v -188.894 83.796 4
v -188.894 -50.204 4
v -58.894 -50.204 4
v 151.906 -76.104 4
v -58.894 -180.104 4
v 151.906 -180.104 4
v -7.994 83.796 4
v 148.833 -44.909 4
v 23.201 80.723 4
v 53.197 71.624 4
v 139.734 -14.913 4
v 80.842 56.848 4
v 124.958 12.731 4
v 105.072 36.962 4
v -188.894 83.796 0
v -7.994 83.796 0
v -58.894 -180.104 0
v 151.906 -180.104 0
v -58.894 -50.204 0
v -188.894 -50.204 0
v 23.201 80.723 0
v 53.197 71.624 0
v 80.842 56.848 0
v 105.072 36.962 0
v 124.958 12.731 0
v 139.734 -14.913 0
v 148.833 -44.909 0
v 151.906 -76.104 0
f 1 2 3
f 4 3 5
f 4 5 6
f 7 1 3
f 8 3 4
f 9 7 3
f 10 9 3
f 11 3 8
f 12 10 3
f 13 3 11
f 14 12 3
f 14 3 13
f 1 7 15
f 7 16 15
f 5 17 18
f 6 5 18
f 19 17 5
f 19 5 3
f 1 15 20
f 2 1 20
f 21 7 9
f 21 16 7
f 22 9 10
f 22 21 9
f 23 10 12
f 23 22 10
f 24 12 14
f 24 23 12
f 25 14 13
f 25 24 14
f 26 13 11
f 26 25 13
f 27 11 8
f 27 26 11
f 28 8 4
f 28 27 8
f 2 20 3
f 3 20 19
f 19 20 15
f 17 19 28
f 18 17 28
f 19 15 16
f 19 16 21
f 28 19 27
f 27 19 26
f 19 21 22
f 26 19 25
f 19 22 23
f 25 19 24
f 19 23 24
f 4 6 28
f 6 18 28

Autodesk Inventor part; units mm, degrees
ref_plane "YZ Plane" through (0, 0, 0) normal (1, 0, 0) x (0, 1, 0)
ref_plane "XZ Plane" through (0, 0, 0) normal (0, 1, 0) x (-1, 0, 0)
ref_plane "XY Plane" through (0, 0, 0) normal (0, 0, 1) x (1, 0, 0)
sketch "Sketch1" plane through (0, 0, 0) normal (0, 0, 1) x (1, 0, 0)
  circle A0 centre (-7.9941, -76.1042) radius 50.9
  line L0 (42.9059, -433.1479) -> (-58.8941, -433.1479)
  arc A1 (-58.8941, -127.0042) -> (42.9059, -127.0042) centre (-7.9941, -76.1042) ccw
  line L1 (147.9059, -76.1042) -> (147.9059, -176.1042)
  line L2 (147.9059, -176.1042) -> (42.9059, -176.1042)
  line L3 (42.9059, -176.1042) -> (42.9059, -127.0042)
  line L4 (-58.8941, -176.1042) -> (-163.8941, -176.1042)
  line L5 (-163.8941, -176.1042) -> (-163.8941, -76.1042)
  line L6 (-163.8941, -76.1042) -> (-58.8941, -76.1042)
  line L7 (-58.8941, -76.1042) -> (-58.8941, -176.1042)
  line L8 (-58.8941, -176.1042) -> (42.9059, -176.1042)
  line L9 (-33.8941, -143.2668) -> (-33.8941, -176.1042)
  arc A2 (147.9059, -76.1042) -> (-163.8941, -76.1042) centre (-7.9941, -76.1042) ccw
  line L10 (-58.8941, -180.1042) -> (-167.8941, -180.1042)
  line L11 (-167.8941, -180.1042) -> (-167.8941, -76.1042)
  line L12 (-58.8941, -180.1042) -> (42.9059, -180.1042)
  line L13 (42.9059, -180.1042) -> (151.9059, -180.1042)
  line L14 (151.9059, -180.1042) -> (151.9059, -76.1042)
  arc A3 (151.9059, -76.1042) -> (-167.8941, -76.1042) centre (-7.9941, -76.1042) ccw
  line L15 (-58.8941, 79.7958) -> (-188.8941, 79.7958)
  line L16 (-188.8941, 79.7958) -> (-188.8941, -50.2042)
  line L17 (-188.8941, -50.2042) -> (-58.8941, -50.2042)
  line L18 (-58.8941, -50.2042) -> (-58.8941, 79.7958)
  line L19 (-58.8941, -76.1042) -> (-58.8941, -50.2042)
  line L20 (-58.8941, -176.1042) -> (-58.8941, -180.6362)
  line L21 (-58.8941, 79.7958) -> (-7.9941, 79.7958)
  line L22 (-188.8941, 79.7958) -> (-7.9941, 79.7958)
  line L23 (-7.9941, 79.7958) -> (-7.9941, 83.7958)
  line L24 (-7.9941, 83.7958) -> (-188.8941, 83.7958)
  line L25 (-188.8941, 83.7958) -> (-188.8941, 79.7958)
  point P0 (0, 0)
  dimension "d0" = 101.8
  dimension "d2" = 100
  dimension "d3" = 130
  dimension "d4" = 4
  dimension "d5" = 4
  dimension "d6" = 4
  dimension "d18" = 130
  dimension "d19" = 130
extrude "Extrusion4" add sketch "Sketch1" along normal blind 4 contours A0 | L19 L18 A2 L1 L2 L3 A1 L7 | A1 L9 L8 L7 | L17 A2 L18 | L17 A3 L18 A2 | A1 L3 L8 L9 | L8 L2 L1 A2 L23 A3 L14 L13 L12 L20 | L18 A3 L21 A2 | L17 L16 L15 L18 A3 | L21 A3 L23 | L18 L21 A3 | L21 L15 L25 L24 A3
equation "\"d20\" = d5"
properties part number "Shooter"
